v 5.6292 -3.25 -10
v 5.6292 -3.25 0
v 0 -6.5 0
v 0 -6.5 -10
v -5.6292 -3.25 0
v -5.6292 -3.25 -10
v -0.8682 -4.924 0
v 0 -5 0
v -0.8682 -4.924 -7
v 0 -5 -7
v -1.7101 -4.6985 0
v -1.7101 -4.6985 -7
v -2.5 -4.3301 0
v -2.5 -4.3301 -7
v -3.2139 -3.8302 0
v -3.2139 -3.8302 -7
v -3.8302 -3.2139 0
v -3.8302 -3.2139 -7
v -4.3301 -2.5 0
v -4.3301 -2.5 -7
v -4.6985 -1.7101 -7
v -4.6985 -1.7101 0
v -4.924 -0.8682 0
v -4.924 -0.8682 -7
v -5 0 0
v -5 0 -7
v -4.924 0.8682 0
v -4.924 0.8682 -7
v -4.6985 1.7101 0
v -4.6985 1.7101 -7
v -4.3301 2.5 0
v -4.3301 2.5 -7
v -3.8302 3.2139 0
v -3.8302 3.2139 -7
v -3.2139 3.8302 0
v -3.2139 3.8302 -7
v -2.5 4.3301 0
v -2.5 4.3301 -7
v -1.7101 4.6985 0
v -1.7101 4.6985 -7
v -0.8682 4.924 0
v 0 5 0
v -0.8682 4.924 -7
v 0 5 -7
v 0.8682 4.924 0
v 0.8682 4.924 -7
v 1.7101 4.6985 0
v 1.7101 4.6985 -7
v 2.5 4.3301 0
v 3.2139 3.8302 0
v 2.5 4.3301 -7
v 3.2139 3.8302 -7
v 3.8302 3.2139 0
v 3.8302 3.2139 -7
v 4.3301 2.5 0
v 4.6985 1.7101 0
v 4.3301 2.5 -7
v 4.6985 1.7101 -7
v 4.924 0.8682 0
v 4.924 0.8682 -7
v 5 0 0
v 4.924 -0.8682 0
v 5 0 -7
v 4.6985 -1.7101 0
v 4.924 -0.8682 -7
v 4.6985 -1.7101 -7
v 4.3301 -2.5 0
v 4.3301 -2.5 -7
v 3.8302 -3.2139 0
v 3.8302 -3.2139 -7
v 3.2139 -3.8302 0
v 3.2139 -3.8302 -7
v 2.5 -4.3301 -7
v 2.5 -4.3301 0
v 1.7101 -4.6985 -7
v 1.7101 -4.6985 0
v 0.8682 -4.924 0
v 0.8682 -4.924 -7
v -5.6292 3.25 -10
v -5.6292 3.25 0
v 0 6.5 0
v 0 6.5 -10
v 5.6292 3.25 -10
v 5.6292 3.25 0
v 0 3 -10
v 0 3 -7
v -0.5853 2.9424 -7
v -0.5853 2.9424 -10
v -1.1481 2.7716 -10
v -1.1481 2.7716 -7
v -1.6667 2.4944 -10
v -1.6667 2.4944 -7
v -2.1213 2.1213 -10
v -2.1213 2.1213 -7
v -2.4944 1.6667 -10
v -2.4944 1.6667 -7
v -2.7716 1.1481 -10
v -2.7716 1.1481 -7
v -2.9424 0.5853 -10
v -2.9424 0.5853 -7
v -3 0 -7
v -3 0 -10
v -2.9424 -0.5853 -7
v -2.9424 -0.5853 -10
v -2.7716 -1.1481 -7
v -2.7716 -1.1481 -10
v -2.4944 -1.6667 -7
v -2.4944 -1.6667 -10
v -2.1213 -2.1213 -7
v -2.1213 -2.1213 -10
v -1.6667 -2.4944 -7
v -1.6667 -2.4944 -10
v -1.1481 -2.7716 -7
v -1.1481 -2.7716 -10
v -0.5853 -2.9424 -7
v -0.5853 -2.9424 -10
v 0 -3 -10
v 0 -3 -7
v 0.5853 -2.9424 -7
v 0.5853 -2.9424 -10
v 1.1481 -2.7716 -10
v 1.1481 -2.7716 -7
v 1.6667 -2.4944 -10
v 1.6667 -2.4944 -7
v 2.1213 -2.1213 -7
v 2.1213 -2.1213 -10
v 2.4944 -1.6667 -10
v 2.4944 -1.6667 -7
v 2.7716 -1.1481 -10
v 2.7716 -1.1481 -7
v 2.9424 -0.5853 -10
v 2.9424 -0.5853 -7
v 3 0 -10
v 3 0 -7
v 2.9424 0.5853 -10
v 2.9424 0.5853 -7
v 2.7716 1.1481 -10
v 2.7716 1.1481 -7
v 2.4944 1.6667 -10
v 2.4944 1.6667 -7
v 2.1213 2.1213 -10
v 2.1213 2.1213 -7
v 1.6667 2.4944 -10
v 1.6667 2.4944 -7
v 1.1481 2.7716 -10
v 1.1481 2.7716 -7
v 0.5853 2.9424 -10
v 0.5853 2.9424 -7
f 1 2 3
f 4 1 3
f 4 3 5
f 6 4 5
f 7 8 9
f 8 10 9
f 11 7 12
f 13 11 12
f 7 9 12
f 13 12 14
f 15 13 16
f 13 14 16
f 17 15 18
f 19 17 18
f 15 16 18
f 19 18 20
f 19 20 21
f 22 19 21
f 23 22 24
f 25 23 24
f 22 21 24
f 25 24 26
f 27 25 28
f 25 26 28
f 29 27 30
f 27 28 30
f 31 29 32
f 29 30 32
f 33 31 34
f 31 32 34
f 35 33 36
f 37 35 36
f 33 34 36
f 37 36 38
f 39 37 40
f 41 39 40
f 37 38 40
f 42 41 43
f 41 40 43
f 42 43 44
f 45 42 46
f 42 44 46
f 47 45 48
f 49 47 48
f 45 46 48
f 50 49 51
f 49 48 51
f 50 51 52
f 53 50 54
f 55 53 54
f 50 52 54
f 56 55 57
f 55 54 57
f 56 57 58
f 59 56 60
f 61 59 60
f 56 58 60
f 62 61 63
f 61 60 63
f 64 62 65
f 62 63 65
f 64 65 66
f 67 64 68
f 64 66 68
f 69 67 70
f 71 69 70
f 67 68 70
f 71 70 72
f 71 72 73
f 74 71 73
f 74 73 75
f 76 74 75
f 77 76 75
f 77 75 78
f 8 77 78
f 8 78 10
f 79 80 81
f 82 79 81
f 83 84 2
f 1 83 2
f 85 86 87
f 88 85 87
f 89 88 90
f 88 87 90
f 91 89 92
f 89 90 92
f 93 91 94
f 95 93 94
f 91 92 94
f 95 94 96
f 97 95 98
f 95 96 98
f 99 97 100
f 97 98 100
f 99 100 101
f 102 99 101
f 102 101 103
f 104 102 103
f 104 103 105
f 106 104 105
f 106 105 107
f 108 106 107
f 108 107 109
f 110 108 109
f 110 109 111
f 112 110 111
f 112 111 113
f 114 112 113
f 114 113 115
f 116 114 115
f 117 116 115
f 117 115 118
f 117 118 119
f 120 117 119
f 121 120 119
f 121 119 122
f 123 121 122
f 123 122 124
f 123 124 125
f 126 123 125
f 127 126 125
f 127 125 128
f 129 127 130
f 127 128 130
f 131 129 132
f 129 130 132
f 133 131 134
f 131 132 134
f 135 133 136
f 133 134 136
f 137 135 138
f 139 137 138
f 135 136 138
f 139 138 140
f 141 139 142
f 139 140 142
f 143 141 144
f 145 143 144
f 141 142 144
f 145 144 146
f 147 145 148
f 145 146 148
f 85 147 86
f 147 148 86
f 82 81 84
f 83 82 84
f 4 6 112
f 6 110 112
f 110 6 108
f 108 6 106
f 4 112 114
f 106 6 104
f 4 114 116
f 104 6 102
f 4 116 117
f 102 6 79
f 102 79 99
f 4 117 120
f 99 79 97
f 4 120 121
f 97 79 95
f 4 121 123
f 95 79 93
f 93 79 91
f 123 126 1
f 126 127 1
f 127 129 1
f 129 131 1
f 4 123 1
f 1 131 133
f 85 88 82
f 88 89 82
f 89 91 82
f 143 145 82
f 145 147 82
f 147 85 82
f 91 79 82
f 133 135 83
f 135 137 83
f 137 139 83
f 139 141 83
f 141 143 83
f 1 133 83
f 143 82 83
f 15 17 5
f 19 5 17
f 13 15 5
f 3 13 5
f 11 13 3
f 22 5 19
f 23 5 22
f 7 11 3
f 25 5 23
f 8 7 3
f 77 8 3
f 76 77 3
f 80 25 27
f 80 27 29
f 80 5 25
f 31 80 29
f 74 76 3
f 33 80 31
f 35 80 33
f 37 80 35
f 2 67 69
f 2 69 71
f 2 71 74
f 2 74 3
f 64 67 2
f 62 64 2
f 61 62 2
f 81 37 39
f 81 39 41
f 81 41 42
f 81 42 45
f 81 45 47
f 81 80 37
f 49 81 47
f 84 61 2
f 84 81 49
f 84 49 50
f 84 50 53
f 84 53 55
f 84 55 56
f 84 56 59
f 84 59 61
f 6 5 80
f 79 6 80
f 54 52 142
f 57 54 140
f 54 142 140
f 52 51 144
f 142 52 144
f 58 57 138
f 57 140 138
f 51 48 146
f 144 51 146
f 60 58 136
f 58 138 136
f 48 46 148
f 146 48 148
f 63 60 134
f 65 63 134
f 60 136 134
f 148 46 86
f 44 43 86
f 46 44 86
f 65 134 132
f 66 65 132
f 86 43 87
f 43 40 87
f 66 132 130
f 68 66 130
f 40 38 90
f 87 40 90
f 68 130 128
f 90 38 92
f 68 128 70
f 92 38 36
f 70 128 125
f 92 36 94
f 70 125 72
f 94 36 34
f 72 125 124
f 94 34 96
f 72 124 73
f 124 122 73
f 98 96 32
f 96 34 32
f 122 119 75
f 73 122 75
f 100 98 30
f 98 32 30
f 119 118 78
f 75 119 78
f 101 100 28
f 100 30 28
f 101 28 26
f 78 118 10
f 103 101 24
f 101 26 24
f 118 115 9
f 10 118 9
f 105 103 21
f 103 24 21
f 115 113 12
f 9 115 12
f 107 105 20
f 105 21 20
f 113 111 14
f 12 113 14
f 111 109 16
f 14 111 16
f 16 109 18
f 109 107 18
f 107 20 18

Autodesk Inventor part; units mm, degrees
ref_plane "YZ Plane" through (0, 0, 0) normal (1, 0, 0) x (0, 1, 0)
ref_plane "XZ Plane" through (0, 0, 0) normal (0, 1, 0) x (-1, 0, 0)
ref_plane "XY Plane" through (0, 0, 0) normal (0, 0, 1) x (1, 0, 0)
sketch "Sketch1" plane through (0, 0, 0) normal (0, 0, 1) x (1, 0, 0)
  line L0 (0, 6.5) -> (5.6292, 3.25)
  line L1 (5.6292, 3.25) -> (5.6292, -3.25)
  line L2 (5.6292, -3.25) -> (0, -6.5)
  line L3 (0, -6.5) -> (-5.6292, -3.25)
  line L4 (-5.6292, -3.25) -> (-5.6292, 3.25)
  line L5 (-5.6292, 3.25) -> (0, 6.5)
  point P0 (0, 0)
  point P1 (0, 0)
  dimension "d0" = 13
extrude "Extrusion1" add sketch "Sketch1" against normal blind 10
sketch "Sketch2" plane through (0, 0, 0) normal (0, 0, 1) x (1, 0, 0)
  point P0 (0, 0)
  point P1 (0, 0)
hole "Hole1" at (0, 0, 0) direction (0, 0, -1) diameter 10 depth 7
thread "Thread1" size "M10x1.5" class "6H" standard "ISO Metric profile" length 10
sketch "Sketch3" plane through (0, 0, -10) normal (0, 0, -1) x (-1, 0, 0)
  point P0 (0, 0)
  point P1 (0, 0)
hole "Hole2" at (0, 0, -10) direction (0, 0, 1) diameter 6 depth 4
properties part number "124"
